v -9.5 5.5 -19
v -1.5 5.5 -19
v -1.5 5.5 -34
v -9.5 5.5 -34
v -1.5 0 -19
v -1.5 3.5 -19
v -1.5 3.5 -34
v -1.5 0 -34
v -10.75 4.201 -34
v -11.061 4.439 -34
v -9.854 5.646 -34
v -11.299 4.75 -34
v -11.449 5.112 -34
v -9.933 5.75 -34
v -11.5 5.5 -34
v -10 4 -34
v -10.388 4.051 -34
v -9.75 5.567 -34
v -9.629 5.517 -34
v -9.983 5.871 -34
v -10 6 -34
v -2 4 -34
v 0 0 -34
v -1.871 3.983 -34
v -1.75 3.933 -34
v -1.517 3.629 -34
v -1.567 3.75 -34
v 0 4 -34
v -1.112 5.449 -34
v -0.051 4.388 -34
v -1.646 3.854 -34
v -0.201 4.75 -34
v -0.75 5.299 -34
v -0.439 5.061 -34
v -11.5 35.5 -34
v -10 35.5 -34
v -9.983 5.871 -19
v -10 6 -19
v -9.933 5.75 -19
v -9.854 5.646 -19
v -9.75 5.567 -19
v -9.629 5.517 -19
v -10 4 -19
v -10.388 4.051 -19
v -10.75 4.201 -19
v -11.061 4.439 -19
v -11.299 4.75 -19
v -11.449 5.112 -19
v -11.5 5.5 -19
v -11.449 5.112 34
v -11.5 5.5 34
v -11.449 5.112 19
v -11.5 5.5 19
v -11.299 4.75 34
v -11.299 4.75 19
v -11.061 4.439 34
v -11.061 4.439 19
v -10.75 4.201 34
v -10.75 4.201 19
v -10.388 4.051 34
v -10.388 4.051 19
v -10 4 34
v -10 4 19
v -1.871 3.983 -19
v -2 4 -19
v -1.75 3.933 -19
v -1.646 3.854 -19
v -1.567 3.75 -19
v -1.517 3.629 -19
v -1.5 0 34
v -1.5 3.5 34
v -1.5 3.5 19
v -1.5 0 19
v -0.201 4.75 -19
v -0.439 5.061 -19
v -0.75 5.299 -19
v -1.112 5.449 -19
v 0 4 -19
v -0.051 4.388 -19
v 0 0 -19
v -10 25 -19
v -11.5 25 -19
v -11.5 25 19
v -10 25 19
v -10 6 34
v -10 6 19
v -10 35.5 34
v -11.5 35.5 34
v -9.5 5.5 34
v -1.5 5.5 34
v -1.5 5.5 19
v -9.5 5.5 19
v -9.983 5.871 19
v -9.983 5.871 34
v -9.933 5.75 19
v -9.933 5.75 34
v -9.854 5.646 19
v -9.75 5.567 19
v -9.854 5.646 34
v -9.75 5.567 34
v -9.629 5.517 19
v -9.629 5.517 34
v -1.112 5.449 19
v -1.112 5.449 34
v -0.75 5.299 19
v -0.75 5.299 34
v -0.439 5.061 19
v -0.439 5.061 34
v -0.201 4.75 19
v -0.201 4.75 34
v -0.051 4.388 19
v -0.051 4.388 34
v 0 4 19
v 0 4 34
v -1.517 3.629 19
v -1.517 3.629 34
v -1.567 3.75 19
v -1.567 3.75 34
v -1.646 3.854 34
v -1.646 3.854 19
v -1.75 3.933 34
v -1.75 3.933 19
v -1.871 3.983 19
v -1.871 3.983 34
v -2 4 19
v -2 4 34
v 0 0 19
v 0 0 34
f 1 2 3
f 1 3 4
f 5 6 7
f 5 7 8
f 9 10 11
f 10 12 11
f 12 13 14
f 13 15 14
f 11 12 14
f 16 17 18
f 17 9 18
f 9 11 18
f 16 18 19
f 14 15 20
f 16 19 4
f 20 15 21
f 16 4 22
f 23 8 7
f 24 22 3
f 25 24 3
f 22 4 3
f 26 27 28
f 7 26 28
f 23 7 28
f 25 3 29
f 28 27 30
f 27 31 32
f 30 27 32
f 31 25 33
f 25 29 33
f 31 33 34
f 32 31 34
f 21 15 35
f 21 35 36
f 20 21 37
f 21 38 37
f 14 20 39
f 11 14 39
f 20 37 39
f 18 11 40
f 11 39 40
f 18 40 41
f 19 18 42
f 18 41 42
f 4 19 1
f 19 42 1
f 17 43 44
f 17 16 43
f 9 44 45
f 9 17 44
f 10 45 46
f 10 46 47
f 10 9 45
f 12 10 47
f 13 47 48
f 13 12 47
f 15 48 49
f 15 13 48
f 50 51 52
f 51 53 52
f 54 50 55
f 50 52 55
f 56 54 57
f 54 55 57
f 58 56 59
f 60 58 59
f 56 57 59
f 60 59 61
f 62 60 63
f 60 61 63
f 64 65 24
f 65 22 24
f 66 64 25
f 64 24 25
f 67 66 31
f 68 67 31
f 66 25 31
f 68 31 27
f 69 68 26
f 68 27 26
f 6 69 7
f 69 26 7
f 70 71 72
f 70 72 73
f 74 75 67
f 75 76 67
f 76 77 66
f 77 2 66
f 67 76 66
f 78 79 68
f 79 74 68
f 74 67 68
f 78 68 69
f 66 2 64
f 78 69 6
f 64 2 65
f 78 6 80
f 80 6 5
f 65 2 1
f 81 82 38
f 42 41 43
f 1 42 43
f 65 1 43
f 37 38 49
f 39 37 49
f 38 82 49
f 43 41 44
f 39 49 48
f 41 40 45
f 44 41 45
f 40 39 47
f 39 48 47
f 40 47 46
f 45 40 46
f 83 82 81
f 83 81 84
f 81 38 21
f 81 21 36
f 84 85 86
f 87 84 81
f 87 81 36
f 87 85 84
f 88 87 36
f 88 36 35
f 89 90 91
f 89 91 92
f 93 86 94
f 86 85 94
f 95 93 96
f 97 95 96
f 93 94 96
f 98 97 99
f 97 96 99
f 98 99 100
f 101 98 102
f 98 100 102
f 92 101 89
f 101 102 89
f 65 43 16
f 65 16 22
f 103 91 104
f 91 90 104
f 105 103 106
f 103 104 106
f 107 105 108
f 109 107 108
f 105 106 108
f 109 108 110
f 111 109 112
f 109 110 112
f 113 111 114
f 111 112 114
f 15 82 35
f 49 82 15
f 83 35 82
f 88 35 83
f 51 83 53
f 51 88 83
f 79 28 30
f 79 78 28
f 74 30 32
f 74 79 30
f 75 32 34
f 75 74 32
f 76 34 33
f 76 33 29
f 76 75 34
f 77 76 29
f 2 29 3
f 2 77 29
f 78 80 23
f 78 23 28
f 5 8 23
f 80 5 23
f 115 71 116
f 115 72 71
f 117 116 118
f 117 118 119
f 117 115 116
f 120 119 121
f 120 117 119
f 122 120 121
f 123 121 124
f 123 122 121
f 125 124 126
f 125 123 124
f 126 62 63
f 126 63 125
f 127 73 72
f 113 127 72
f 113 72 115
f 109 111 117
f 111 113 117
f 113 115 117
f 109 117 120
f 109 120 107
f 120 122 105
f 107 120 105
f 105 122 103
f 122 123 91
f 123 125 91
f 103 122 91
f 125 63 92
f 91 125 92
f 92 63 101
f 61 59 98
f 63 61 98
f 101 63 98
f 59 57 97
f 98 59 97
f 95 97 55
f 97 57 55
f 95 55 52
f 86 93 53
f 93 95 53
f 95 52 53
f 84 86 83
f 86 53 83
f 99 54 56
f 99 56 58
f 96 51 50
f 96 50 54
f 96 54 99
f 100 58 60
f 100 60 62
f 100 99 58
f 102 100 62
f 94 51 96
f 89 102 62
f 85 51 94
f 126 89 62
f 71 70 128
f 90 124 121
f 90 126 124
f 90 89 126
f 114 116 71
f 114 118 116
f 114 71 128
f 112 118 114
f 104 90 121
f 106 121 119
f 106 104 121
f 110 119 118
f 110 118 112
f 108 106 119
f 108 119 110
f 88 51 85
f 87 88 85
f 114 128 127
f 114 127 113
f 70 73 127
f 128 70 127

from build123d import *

# Parameters (mm, degrees)
F1_DEPTH = 34
F2_W     = 4
F2_H     = 38
F2_W_2   = 21
F3_DEPTH = 50
F4_R     = 1.5
F5_R     = 0.5


with BuildPart() as f1:
    # F0 (on Top) → F1 (new body, symmetric)
    with BuildSketch(Plane.XY):
        Polygon((-1.5, 4), (-1.5, 0), (0, 0), (0, 5.5), (-10, 5.5), (-10, 35.5), (-11.5, 35.5), (-11.5, 4), align=None)
    extrude(amount=F1_DEPTH, both=True)

    # F2 (on face) → F3 (cut)
    with BuildSketch(Plane(origin=(-11.5, 0, 0), x_dir=(0, -1, 0), z_dir=(-1, 0, 0))):
        with Locations((-2, 0)):
            Rectangle(F2_W, F2_H)
        with Locations((-14.5, 0)):
            Rectangle(F2_W_2, F2_H)
    extrude(amount=-F3_DEPTH, mode=Mode.SUBTRACT)

    # F4
    f4_edges = [f1.edges().sort_by_distance(p)[0] for p in [
        (0, 5.5, -26.5),
        (0, 5.5, 26.5),
        (-11.5, 4, -26.5),
        (-11.5, 4, 26.5),
    ]]
    fillet(f4_edges, radius=F4_R)

    # F5
    f5_edges = [f1.edges().sort_by_distance(p)[0] for p in [
        (-10, 5.5, -26.5),
        (-10, 5.5, 26.5),
        (-1.5, 4, -26.5),
        (-1.5, 4, 26.5),
    ]]
    fillet(f5_edges, radius=F5_R)


solid = f1.part
